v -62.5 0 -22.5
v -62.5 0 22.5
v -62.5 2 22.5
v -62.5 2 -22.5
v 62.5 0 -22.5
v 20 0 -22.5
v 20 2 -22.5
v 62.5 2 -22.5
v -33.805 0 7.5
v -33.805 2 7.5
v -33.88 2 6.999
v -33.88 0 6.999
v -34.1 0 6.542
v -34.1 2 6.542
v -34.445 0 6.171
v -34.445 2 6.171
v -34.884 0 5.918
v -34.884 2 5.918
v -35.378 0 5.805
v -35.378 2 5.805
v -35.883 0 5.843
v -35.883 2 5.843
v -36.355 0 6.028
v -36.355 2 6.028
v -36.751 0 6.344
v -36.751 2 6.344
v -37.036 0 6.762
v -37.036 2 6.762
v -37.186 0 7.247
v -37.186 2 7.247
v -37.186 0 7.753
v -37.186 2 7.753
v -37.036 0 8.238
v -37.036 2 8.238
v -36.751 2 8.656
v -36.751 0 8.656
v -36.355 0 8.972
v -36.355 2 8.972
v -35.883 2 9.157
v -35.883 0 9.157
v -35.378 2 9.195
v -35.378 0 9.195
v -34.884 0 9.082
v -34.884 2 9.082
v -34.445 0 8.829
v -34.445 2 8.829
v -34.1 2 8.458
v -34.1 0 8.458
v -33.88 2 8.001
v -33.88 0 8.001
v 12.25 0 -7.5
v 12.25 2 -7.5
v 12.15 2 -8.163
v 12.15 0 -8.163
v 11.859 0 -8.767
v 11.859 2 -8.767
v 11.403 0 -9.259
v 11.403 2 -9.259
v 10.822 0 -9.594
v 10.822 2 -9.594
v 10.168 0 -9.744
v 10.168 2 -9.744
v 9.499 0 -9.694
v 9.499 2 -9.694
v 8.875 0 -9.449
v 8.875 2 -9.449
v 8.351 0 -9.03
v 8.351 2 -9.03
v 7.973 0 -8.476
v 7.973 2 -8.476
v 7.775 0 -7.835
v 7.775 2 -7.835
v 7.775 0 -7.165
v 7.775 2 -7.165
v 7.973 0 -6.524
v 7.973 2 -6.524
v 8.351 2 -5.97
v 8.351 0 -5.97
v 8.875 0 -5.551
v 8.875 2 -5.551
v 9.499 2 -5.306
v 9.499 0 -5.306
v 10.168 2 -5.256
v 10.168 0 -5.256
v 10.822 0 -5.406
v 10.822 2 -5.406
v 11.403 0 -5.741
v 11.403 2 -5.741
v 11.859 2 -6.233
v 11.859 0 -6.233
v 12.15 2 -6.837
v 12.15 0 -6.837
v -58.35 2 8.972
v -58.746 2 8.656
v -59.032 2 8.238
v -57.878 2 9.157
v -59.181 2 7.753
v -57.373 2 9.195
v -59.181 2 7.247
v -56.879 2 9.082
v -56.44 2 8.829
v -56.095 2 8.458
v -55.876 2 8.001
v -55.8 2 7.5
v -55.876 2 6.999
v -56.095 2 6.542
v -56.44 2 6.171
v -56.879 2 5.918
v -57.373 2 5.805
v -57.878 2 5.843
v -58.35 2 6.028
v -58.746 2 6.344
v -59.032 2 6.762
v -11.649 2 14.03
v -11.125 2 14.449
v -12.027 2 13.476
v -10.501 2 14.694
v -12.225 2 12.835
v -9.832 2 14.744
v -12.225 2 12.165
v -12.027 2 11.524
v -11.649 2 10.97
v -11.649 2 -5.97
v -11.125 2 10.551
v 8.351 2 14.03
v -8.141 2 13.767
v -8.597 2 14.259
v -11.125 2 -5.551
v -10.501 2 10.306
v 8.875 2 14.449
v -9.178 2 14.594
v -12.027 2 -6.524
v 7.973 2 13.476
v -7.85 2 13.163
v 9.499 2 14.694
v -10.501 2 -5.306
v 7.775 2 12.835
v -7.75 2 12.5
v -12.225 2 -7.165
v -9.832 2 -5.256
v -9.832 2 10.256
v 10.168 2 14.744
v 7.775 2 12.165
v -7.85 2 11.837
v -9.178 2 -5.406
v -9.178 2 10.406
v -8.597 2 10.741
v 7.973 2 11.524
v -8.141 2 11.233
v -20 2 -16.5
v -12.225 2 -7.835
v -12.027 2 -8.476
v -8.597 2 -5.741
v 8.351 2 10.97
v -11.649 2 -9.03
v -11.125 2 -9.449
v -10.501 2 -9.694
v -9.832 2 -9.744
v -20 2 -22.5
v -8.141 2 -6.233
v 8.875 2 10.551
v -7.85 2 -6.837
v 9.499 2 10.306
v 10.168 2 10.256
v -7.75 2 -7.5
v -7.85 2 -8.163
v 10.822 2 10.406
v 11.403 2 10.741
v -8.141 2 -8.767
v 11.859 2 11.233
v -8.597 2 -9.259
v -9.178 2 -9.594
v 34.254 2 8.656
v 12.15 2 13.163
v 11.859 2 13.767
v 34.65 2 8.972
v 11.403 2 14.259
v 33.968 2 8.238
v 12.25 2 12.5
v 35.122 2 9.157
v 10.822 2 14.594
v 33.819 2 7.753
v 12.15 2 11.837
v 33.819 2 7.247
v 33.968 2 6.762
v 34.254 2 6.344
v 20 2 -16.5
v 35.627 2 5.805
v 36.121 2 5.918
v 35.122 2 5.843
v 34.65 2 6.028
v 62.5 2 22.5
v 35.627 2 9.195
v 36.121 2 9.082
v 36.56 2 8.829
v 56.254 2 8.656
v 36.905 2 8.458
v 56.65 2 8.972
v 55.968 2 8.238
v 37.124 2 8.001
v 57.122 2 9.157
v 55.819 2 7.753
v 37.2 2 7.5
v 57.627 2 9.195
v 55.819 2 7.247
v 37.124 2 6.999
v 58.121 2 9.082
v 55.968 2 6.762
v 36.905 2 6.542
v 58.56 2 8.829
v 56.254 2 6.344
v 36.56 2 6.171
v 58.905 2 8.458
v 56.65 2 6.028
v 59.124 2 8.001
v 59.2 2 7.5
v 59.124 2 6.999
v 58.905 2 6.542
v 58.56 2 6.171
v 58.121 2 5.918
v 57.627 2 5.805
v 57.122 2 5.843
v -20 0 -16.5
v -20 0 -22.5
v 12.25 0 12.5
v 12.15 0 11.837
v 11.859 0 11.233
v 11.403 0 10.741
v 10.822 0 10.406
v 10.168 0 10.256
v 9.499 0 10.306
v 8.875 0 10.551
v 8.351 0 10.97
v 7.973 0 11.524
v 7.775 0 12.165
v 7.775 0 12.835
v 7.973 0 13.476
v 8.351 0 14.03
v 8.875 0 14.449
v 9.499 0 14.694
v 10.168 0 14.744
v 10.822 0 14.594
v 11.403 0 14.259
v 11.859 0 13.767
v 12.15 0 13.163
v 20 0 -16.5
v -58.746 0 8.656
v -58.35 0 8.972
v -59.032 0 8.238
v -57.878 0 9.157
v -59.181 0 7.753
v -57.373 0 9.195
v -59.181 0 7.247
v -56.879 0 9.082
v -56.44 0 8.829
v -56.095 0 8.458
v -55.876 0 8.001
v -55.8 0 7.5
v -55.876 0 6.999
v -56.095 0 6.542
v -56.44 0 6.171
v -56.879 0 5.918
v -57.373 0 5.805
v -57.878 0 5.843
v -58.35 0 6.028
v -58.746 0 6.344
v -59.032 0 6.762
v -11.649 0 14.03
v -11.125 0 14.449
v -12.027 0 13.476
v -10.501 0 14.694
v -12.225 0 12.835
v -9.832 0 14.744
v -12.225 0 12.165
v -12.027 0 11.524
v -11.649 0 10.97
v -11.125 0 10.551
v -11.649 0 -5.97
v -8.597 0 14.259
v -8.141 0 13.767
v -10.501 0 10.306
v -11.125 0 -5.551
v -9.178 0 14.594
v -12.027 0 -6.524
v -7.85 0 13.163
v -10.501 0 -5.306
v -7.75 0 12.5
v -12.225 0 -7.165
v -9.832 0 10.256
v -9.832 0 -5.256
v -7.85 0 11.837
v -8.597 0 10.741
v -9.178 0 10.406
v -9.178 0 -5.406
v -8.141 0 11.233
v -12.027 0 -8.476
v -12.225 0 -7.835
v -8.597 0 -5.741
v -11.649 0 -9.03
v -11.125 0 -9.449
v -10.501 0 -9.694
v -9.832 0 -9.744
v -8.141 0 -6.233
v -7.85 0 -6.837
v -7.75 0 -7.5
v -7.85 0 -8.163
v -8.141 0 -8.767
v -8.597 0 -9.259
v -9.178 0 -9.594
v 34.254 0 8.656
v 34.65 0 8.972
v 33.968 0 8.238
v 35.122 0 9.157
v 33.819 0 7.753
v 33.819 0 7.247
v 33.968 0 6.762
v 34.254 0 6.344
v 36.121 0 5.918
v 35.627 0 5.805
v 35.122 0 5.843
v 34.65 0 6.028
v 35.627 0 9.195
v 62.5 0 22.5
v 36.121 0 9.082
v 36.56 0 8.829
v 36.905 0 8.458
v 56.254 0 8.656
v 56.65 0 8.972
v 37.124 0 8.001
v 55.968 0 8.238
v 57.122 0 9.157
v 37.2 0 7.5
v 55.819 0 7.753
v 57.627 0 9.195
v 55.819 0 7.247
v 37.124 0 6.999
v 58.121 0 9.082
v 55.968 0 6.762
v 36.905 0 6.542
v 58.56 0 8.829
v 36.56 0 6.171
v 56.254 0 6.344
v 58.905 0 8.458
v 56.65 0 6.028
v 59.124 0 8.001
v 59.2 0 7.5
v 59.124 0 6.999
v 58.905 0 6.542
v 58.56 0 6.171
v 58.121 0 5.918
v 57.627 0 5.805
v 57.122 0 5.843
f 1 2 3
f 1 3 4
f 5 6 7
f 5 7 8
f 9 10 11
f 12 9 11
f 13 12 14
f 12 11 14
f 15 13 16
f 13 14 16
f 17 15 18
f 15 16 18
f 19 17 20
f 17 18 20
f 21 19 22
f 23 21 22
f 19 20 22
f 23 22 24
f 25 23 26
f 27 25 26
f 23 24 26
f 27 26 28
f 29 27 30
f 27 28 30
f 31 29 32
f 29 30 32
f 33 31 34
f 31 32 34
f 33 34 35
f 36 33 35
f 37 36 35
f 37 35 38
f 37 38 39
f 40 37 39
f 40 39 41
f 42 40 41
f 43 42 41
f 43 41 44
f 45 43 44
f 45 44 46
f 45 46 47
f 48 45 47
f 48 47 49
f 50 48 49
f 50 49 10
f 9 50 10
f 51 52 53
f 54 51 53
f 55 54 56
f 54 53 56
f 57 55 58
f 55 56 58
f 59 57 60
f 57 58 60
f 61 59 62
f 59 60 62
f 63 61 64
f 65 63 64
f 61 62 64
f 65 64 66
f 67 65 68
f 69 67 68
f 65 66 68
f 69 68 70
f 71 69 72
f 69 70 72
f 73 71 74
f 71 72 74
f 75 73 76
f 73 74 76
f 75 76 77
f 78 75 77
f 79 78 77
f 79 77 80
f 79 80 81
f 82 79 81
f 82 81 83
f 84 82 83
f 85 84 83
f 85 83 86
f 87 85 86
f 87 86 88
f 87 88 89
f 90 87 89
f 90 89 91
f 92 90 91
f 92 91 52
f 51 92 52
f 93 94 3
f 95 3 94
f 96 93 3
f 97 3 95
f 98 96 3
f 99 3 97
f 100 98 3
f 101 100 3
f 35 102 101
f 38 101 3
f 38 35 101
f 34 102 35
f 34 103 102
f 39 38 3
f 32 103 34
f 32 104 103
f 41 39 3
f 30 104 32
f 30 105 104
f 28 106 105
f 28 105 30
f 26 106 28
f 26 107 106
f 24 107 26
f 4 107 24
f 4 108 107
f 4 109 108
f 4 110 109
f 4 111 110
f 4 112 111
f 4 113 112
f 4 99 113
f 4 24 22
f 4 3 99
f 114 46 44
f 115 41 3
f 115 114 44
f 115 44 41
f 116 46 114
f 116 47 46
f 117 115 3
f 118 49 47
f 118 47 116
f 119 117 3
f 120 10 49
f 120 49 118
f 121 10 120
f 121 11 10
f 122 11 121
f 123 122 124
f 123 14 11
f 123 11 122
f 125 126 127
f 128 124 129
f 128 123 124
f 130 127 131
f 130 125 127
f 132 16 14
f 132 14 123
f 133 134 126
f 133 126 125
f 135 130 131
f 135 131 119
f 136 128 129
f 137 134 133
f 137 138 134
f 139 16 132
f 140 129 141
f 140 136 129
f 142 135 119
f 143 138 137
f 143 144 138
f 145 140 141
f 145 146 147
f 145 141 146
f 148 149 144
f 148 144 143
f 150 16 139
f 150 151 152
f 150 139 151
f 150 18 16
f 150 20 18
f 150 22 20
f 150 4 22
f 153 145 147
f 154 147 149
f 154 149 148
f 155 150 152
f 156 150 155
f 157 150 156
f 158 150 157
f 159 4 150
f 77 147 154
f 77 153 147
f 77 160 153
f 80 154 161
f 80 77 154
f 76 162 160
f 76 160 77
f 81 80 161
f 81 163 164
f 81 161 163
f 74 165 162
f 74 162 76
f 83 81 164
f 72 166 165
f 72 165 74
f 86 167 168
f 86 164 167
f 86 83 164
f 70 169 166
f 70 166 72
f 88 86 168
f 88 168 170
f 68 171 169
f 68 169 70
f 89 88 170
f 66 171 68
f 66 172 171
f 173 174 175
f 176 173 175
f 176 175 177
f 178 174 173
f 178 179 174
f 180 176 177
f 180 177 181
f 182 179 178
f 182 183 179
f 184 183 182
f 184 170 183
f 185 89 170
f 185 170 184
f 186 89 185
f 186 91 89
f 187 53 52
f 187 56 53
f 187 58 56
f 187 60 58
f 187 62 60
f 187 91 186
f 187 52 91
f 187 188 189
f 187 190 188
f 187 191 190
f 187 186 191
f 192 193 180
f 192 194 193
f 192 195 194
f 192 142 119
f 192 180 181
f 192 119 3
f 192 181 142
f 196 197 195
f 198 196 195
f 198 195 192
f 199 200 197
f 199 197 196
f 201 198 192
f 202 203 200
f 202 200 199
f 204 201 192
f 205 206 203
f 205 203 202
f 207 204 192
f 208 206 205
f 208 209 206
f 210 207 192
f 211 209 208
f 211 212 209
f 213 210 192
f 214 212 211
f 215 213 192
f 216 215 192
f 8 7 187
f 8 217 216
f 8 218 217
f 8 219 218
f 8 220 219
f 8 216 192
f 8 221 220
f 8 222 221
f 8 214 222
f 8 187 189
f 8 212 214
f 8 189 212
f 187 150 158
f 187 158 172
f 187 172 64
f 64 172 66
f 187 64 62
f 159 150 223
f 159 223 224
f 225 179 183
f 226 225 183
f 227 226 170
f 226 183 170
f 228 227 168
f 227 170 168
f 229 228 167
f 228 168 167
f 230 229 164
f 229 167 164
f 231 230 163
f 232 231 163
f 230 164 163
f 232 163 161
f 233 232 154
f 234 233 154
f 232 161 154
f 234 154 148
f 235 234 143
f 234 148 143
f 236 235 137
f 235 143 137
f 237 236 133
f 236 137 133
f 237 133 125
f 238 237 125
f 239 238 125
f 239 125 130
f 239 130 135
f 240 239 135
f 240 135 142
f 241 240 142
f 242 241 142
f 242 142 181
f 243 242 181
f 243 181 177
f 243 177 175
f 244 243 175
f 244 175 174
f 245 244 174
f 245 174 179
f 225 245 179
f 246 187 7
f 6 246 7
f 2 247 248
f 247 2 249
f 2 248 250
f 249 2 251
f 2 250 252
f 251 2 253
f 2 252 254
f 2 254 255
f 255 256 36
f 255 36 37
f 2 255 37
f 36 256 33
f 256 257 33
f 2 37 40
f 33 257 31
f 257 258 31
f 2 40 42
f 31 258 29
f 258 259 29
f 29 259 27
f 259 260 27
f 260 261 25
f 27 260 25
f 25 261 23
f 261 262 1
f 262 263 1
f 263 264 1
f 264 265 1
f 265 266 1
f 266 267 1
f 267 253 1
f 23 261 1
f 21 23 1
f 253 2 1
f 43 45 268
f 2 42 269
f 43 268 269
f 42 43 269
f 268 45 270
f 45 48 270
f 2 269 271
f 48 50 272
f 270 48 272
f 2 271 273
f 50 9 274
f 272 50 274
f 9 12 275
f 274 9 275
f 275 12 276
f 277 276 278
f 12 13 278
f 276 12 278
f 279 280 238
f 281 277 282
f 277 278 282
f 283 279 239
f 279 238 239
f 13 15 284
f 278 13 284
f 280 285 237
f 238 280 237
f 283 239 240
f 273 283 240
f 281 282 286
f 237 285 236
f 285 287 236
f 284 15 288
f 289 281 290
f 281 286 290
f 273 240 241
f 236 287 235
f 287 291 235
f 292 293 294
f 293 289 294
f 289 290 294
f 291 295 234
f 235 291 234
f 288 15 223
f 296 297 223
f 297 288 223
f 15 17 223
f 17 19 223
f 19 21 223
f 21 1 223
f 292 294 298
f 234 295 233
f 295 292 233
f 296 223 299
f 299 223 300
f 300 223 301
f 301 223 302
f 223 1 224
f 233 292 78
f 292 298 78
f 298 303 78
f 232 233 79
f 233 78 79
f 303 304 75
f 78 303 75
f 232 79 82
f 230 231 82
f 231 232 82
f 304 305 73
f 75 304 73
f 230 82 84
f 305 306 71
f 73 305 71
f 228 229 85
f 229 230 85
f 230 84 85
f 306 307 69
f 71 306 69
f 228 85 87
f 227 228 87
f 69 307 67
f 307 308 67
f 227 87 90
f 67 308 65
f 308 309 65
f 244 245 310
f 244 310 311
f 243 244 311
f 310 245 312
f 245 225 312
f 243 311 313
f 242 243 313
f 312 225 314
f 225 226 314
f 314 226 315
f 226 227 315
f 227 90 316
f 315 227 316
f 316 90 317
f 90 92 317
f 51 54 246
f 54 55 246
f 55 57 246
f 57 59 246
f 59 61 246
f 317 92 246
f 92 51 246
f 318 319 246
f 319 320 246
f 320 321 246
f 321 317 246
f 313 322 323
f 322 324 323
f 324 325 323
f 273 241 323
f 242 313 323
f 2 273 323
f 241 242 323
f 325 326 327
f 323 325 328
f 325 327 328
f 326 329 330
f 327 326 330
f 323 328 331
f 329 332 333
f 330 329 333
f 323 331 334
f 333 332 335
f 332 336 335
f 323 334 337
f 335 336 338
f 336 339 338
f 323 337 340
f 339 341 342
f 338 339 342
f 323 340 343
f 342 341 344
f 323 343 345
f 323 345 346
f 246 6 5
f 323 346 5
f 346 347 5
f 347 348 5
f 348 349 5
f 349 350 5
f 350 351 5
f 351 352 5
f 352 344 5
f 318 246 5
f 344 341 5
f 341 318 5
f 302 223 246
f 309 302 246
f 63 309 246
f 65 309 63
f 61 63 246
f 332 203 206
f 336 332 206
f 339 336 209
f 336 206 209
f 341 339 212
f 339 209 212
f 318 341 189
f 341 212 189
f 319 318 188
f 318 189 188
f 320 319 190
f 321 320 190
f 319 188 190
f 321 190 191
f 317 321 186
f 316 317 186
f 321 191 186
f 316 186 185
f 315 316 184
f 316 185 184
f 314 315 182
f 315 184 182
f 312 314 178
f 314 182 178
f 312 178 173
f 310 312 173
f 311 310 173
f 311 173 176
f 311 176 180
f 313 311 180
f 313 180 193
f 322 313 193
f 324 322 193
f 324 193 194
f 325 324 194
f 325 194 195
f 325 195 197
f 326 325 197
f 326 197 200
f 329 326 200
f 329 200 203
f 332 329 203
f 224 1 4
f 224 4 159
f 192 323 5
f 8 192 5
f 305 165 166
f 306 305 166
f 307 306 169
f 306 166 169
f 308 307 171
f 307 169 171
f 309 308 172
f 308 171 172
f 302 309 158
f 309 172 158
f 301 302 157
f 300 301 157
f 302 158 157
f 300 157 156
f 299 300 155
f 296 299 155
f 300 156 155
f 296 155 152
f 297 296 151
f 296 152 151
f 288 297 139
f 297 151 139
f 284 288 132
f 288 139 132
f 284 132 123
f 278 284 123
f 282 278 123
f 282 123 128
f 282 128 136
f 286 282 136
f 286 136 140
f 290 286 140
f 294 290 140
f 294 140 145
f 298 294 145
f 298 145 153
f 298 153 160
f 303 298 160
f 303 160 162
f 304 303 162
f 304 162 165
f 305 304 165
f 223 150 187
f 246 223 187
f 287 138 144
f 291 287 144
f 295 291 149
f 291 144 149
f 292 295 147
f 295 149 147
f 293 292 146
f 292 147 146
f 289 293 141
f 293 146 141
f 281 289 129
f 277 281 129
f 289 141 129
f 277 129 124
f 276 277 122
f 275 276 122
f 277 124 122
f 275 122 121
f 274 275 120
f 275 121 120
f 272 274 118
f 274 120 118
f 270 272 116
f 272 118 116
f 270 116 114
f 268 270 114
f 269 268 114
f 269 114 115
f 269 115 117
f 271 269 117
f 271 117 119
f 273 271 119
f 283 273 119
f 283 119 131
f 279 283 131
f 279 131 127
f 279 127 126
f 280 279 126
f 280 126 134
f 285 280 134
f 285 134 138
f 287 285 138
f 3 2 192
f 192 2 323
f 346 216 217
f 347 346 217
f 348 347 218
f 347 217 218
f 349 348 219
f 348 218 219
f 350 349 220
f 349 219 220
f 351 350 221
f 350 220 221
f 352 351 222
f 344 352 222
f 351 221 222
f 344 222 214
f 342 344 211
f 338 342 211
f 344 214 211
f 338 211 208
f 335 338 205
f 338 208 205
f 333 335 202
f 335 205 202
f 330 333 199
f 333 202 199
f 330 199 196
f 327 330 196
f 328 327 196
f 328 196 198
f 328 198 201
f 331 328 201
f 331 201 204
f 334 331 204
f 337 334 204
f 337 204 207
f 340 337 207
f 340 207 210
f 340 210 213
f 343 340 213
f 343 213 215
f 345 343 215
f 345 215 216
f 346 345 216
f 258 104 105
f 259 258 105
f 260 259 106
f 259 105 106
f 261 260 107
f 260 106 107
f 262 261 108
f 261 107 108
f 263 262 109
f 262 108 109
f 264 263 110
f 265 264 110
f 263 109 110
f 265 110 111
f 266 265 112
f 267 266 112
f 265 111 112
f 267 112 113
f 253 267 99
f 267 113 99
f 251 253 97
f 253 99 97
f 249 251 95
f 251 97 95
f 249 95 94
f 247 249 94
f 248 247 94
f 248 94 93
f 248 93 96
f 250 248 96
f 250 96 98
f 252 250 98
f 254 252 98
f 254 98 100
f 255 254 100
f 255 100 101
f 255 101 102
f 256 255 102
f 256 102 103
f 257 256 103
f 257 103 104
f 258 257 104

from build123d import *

# Parameters (mm, degrees)
SKETCH1_W           = 125
SKETCH1_H           = 45
BOSS_EXTRUDE1_DEPTH = 2
SKETCH2_R           = 2.25
CUT_EXTRUDE1_DEPTH  = 10
SKETCH3_R           = 1.7
CUT_EXTRUDE2_DEPTH  = 10
SKETCH4_W           = 40
SKETCH4_H           = 6
CUT_EXTRUDE3_DEPTH  = 10


with BuildPart() as part:
    # Sketch1 → Boss-Extrude1 (new body)
    with BuildSketch(Plane(origin=(0, 0, 0), x_dir=(1, 0, 0), z_dir=(0, 1, 0))):
        Rectangle(SKETCH1_W, SKETCH1_H)
    extrude(amount=BOSS_EXTRUDE1_DEPTH)

    # Sketch2 → Cut-Extrude1 (cut)
    with BuildSketch(Plane(origin=(0, 2, 0), x_dir=(1, 0, 0), z_dir=(0, 1, 0))):
        with Locations((-10, -12.5)):
            Circle(SKETCH2_R)
        with Locations((10, -12.5)):
            Circle(SKETCH2_R)
        with Locations((-10, 7.5)):
            Circle(SKETCH2_R)
        with Locations((10, 7.5)):
            Circle(SKETCH2_R)
    extrude(amount=-CUT_EXTRUDE1_DEPTH, mode=Mode.SUBTRACT)

    # Sketch3 → Cut-Extrude2 (cut)
    with BuildSketch(Plane(origin=(0, 2, 0), x_dir=(1, 0, 0), z_dir=(0, 1, 0))):
        with Locations((57.5, -7.5)):
            Circle(SKETCH3_R)
        with Locations((35.5, -7.5)):
            Circle(SKETCH3_R)
        with Locations((-35.504729394, -7.5)):
            Circle(SKETCH3_R)
        with Locations((-57.5, -7.5)):
            Circle(SKETCH3_R)
    extrude(amount=-CUT_EXTRUDE2_DEPTH, mode=Mode.SUBTRACT)

    # Sketch4 → Cut-Extrude3 (cut)
    with BuildSketch(Plane(origin=(0, 2, 0), x_dir=(1, 0, 0), z_dir=(0, 1, 0))):
        with Locations((0, 19.5)):
            Rectangle(SKETCH4_W, SKETCH4_H)
    extrude(amount=-CUT_EXTRUDE3_DEPTH, mode=Mode.SUBTRACT)


solid = part.part
